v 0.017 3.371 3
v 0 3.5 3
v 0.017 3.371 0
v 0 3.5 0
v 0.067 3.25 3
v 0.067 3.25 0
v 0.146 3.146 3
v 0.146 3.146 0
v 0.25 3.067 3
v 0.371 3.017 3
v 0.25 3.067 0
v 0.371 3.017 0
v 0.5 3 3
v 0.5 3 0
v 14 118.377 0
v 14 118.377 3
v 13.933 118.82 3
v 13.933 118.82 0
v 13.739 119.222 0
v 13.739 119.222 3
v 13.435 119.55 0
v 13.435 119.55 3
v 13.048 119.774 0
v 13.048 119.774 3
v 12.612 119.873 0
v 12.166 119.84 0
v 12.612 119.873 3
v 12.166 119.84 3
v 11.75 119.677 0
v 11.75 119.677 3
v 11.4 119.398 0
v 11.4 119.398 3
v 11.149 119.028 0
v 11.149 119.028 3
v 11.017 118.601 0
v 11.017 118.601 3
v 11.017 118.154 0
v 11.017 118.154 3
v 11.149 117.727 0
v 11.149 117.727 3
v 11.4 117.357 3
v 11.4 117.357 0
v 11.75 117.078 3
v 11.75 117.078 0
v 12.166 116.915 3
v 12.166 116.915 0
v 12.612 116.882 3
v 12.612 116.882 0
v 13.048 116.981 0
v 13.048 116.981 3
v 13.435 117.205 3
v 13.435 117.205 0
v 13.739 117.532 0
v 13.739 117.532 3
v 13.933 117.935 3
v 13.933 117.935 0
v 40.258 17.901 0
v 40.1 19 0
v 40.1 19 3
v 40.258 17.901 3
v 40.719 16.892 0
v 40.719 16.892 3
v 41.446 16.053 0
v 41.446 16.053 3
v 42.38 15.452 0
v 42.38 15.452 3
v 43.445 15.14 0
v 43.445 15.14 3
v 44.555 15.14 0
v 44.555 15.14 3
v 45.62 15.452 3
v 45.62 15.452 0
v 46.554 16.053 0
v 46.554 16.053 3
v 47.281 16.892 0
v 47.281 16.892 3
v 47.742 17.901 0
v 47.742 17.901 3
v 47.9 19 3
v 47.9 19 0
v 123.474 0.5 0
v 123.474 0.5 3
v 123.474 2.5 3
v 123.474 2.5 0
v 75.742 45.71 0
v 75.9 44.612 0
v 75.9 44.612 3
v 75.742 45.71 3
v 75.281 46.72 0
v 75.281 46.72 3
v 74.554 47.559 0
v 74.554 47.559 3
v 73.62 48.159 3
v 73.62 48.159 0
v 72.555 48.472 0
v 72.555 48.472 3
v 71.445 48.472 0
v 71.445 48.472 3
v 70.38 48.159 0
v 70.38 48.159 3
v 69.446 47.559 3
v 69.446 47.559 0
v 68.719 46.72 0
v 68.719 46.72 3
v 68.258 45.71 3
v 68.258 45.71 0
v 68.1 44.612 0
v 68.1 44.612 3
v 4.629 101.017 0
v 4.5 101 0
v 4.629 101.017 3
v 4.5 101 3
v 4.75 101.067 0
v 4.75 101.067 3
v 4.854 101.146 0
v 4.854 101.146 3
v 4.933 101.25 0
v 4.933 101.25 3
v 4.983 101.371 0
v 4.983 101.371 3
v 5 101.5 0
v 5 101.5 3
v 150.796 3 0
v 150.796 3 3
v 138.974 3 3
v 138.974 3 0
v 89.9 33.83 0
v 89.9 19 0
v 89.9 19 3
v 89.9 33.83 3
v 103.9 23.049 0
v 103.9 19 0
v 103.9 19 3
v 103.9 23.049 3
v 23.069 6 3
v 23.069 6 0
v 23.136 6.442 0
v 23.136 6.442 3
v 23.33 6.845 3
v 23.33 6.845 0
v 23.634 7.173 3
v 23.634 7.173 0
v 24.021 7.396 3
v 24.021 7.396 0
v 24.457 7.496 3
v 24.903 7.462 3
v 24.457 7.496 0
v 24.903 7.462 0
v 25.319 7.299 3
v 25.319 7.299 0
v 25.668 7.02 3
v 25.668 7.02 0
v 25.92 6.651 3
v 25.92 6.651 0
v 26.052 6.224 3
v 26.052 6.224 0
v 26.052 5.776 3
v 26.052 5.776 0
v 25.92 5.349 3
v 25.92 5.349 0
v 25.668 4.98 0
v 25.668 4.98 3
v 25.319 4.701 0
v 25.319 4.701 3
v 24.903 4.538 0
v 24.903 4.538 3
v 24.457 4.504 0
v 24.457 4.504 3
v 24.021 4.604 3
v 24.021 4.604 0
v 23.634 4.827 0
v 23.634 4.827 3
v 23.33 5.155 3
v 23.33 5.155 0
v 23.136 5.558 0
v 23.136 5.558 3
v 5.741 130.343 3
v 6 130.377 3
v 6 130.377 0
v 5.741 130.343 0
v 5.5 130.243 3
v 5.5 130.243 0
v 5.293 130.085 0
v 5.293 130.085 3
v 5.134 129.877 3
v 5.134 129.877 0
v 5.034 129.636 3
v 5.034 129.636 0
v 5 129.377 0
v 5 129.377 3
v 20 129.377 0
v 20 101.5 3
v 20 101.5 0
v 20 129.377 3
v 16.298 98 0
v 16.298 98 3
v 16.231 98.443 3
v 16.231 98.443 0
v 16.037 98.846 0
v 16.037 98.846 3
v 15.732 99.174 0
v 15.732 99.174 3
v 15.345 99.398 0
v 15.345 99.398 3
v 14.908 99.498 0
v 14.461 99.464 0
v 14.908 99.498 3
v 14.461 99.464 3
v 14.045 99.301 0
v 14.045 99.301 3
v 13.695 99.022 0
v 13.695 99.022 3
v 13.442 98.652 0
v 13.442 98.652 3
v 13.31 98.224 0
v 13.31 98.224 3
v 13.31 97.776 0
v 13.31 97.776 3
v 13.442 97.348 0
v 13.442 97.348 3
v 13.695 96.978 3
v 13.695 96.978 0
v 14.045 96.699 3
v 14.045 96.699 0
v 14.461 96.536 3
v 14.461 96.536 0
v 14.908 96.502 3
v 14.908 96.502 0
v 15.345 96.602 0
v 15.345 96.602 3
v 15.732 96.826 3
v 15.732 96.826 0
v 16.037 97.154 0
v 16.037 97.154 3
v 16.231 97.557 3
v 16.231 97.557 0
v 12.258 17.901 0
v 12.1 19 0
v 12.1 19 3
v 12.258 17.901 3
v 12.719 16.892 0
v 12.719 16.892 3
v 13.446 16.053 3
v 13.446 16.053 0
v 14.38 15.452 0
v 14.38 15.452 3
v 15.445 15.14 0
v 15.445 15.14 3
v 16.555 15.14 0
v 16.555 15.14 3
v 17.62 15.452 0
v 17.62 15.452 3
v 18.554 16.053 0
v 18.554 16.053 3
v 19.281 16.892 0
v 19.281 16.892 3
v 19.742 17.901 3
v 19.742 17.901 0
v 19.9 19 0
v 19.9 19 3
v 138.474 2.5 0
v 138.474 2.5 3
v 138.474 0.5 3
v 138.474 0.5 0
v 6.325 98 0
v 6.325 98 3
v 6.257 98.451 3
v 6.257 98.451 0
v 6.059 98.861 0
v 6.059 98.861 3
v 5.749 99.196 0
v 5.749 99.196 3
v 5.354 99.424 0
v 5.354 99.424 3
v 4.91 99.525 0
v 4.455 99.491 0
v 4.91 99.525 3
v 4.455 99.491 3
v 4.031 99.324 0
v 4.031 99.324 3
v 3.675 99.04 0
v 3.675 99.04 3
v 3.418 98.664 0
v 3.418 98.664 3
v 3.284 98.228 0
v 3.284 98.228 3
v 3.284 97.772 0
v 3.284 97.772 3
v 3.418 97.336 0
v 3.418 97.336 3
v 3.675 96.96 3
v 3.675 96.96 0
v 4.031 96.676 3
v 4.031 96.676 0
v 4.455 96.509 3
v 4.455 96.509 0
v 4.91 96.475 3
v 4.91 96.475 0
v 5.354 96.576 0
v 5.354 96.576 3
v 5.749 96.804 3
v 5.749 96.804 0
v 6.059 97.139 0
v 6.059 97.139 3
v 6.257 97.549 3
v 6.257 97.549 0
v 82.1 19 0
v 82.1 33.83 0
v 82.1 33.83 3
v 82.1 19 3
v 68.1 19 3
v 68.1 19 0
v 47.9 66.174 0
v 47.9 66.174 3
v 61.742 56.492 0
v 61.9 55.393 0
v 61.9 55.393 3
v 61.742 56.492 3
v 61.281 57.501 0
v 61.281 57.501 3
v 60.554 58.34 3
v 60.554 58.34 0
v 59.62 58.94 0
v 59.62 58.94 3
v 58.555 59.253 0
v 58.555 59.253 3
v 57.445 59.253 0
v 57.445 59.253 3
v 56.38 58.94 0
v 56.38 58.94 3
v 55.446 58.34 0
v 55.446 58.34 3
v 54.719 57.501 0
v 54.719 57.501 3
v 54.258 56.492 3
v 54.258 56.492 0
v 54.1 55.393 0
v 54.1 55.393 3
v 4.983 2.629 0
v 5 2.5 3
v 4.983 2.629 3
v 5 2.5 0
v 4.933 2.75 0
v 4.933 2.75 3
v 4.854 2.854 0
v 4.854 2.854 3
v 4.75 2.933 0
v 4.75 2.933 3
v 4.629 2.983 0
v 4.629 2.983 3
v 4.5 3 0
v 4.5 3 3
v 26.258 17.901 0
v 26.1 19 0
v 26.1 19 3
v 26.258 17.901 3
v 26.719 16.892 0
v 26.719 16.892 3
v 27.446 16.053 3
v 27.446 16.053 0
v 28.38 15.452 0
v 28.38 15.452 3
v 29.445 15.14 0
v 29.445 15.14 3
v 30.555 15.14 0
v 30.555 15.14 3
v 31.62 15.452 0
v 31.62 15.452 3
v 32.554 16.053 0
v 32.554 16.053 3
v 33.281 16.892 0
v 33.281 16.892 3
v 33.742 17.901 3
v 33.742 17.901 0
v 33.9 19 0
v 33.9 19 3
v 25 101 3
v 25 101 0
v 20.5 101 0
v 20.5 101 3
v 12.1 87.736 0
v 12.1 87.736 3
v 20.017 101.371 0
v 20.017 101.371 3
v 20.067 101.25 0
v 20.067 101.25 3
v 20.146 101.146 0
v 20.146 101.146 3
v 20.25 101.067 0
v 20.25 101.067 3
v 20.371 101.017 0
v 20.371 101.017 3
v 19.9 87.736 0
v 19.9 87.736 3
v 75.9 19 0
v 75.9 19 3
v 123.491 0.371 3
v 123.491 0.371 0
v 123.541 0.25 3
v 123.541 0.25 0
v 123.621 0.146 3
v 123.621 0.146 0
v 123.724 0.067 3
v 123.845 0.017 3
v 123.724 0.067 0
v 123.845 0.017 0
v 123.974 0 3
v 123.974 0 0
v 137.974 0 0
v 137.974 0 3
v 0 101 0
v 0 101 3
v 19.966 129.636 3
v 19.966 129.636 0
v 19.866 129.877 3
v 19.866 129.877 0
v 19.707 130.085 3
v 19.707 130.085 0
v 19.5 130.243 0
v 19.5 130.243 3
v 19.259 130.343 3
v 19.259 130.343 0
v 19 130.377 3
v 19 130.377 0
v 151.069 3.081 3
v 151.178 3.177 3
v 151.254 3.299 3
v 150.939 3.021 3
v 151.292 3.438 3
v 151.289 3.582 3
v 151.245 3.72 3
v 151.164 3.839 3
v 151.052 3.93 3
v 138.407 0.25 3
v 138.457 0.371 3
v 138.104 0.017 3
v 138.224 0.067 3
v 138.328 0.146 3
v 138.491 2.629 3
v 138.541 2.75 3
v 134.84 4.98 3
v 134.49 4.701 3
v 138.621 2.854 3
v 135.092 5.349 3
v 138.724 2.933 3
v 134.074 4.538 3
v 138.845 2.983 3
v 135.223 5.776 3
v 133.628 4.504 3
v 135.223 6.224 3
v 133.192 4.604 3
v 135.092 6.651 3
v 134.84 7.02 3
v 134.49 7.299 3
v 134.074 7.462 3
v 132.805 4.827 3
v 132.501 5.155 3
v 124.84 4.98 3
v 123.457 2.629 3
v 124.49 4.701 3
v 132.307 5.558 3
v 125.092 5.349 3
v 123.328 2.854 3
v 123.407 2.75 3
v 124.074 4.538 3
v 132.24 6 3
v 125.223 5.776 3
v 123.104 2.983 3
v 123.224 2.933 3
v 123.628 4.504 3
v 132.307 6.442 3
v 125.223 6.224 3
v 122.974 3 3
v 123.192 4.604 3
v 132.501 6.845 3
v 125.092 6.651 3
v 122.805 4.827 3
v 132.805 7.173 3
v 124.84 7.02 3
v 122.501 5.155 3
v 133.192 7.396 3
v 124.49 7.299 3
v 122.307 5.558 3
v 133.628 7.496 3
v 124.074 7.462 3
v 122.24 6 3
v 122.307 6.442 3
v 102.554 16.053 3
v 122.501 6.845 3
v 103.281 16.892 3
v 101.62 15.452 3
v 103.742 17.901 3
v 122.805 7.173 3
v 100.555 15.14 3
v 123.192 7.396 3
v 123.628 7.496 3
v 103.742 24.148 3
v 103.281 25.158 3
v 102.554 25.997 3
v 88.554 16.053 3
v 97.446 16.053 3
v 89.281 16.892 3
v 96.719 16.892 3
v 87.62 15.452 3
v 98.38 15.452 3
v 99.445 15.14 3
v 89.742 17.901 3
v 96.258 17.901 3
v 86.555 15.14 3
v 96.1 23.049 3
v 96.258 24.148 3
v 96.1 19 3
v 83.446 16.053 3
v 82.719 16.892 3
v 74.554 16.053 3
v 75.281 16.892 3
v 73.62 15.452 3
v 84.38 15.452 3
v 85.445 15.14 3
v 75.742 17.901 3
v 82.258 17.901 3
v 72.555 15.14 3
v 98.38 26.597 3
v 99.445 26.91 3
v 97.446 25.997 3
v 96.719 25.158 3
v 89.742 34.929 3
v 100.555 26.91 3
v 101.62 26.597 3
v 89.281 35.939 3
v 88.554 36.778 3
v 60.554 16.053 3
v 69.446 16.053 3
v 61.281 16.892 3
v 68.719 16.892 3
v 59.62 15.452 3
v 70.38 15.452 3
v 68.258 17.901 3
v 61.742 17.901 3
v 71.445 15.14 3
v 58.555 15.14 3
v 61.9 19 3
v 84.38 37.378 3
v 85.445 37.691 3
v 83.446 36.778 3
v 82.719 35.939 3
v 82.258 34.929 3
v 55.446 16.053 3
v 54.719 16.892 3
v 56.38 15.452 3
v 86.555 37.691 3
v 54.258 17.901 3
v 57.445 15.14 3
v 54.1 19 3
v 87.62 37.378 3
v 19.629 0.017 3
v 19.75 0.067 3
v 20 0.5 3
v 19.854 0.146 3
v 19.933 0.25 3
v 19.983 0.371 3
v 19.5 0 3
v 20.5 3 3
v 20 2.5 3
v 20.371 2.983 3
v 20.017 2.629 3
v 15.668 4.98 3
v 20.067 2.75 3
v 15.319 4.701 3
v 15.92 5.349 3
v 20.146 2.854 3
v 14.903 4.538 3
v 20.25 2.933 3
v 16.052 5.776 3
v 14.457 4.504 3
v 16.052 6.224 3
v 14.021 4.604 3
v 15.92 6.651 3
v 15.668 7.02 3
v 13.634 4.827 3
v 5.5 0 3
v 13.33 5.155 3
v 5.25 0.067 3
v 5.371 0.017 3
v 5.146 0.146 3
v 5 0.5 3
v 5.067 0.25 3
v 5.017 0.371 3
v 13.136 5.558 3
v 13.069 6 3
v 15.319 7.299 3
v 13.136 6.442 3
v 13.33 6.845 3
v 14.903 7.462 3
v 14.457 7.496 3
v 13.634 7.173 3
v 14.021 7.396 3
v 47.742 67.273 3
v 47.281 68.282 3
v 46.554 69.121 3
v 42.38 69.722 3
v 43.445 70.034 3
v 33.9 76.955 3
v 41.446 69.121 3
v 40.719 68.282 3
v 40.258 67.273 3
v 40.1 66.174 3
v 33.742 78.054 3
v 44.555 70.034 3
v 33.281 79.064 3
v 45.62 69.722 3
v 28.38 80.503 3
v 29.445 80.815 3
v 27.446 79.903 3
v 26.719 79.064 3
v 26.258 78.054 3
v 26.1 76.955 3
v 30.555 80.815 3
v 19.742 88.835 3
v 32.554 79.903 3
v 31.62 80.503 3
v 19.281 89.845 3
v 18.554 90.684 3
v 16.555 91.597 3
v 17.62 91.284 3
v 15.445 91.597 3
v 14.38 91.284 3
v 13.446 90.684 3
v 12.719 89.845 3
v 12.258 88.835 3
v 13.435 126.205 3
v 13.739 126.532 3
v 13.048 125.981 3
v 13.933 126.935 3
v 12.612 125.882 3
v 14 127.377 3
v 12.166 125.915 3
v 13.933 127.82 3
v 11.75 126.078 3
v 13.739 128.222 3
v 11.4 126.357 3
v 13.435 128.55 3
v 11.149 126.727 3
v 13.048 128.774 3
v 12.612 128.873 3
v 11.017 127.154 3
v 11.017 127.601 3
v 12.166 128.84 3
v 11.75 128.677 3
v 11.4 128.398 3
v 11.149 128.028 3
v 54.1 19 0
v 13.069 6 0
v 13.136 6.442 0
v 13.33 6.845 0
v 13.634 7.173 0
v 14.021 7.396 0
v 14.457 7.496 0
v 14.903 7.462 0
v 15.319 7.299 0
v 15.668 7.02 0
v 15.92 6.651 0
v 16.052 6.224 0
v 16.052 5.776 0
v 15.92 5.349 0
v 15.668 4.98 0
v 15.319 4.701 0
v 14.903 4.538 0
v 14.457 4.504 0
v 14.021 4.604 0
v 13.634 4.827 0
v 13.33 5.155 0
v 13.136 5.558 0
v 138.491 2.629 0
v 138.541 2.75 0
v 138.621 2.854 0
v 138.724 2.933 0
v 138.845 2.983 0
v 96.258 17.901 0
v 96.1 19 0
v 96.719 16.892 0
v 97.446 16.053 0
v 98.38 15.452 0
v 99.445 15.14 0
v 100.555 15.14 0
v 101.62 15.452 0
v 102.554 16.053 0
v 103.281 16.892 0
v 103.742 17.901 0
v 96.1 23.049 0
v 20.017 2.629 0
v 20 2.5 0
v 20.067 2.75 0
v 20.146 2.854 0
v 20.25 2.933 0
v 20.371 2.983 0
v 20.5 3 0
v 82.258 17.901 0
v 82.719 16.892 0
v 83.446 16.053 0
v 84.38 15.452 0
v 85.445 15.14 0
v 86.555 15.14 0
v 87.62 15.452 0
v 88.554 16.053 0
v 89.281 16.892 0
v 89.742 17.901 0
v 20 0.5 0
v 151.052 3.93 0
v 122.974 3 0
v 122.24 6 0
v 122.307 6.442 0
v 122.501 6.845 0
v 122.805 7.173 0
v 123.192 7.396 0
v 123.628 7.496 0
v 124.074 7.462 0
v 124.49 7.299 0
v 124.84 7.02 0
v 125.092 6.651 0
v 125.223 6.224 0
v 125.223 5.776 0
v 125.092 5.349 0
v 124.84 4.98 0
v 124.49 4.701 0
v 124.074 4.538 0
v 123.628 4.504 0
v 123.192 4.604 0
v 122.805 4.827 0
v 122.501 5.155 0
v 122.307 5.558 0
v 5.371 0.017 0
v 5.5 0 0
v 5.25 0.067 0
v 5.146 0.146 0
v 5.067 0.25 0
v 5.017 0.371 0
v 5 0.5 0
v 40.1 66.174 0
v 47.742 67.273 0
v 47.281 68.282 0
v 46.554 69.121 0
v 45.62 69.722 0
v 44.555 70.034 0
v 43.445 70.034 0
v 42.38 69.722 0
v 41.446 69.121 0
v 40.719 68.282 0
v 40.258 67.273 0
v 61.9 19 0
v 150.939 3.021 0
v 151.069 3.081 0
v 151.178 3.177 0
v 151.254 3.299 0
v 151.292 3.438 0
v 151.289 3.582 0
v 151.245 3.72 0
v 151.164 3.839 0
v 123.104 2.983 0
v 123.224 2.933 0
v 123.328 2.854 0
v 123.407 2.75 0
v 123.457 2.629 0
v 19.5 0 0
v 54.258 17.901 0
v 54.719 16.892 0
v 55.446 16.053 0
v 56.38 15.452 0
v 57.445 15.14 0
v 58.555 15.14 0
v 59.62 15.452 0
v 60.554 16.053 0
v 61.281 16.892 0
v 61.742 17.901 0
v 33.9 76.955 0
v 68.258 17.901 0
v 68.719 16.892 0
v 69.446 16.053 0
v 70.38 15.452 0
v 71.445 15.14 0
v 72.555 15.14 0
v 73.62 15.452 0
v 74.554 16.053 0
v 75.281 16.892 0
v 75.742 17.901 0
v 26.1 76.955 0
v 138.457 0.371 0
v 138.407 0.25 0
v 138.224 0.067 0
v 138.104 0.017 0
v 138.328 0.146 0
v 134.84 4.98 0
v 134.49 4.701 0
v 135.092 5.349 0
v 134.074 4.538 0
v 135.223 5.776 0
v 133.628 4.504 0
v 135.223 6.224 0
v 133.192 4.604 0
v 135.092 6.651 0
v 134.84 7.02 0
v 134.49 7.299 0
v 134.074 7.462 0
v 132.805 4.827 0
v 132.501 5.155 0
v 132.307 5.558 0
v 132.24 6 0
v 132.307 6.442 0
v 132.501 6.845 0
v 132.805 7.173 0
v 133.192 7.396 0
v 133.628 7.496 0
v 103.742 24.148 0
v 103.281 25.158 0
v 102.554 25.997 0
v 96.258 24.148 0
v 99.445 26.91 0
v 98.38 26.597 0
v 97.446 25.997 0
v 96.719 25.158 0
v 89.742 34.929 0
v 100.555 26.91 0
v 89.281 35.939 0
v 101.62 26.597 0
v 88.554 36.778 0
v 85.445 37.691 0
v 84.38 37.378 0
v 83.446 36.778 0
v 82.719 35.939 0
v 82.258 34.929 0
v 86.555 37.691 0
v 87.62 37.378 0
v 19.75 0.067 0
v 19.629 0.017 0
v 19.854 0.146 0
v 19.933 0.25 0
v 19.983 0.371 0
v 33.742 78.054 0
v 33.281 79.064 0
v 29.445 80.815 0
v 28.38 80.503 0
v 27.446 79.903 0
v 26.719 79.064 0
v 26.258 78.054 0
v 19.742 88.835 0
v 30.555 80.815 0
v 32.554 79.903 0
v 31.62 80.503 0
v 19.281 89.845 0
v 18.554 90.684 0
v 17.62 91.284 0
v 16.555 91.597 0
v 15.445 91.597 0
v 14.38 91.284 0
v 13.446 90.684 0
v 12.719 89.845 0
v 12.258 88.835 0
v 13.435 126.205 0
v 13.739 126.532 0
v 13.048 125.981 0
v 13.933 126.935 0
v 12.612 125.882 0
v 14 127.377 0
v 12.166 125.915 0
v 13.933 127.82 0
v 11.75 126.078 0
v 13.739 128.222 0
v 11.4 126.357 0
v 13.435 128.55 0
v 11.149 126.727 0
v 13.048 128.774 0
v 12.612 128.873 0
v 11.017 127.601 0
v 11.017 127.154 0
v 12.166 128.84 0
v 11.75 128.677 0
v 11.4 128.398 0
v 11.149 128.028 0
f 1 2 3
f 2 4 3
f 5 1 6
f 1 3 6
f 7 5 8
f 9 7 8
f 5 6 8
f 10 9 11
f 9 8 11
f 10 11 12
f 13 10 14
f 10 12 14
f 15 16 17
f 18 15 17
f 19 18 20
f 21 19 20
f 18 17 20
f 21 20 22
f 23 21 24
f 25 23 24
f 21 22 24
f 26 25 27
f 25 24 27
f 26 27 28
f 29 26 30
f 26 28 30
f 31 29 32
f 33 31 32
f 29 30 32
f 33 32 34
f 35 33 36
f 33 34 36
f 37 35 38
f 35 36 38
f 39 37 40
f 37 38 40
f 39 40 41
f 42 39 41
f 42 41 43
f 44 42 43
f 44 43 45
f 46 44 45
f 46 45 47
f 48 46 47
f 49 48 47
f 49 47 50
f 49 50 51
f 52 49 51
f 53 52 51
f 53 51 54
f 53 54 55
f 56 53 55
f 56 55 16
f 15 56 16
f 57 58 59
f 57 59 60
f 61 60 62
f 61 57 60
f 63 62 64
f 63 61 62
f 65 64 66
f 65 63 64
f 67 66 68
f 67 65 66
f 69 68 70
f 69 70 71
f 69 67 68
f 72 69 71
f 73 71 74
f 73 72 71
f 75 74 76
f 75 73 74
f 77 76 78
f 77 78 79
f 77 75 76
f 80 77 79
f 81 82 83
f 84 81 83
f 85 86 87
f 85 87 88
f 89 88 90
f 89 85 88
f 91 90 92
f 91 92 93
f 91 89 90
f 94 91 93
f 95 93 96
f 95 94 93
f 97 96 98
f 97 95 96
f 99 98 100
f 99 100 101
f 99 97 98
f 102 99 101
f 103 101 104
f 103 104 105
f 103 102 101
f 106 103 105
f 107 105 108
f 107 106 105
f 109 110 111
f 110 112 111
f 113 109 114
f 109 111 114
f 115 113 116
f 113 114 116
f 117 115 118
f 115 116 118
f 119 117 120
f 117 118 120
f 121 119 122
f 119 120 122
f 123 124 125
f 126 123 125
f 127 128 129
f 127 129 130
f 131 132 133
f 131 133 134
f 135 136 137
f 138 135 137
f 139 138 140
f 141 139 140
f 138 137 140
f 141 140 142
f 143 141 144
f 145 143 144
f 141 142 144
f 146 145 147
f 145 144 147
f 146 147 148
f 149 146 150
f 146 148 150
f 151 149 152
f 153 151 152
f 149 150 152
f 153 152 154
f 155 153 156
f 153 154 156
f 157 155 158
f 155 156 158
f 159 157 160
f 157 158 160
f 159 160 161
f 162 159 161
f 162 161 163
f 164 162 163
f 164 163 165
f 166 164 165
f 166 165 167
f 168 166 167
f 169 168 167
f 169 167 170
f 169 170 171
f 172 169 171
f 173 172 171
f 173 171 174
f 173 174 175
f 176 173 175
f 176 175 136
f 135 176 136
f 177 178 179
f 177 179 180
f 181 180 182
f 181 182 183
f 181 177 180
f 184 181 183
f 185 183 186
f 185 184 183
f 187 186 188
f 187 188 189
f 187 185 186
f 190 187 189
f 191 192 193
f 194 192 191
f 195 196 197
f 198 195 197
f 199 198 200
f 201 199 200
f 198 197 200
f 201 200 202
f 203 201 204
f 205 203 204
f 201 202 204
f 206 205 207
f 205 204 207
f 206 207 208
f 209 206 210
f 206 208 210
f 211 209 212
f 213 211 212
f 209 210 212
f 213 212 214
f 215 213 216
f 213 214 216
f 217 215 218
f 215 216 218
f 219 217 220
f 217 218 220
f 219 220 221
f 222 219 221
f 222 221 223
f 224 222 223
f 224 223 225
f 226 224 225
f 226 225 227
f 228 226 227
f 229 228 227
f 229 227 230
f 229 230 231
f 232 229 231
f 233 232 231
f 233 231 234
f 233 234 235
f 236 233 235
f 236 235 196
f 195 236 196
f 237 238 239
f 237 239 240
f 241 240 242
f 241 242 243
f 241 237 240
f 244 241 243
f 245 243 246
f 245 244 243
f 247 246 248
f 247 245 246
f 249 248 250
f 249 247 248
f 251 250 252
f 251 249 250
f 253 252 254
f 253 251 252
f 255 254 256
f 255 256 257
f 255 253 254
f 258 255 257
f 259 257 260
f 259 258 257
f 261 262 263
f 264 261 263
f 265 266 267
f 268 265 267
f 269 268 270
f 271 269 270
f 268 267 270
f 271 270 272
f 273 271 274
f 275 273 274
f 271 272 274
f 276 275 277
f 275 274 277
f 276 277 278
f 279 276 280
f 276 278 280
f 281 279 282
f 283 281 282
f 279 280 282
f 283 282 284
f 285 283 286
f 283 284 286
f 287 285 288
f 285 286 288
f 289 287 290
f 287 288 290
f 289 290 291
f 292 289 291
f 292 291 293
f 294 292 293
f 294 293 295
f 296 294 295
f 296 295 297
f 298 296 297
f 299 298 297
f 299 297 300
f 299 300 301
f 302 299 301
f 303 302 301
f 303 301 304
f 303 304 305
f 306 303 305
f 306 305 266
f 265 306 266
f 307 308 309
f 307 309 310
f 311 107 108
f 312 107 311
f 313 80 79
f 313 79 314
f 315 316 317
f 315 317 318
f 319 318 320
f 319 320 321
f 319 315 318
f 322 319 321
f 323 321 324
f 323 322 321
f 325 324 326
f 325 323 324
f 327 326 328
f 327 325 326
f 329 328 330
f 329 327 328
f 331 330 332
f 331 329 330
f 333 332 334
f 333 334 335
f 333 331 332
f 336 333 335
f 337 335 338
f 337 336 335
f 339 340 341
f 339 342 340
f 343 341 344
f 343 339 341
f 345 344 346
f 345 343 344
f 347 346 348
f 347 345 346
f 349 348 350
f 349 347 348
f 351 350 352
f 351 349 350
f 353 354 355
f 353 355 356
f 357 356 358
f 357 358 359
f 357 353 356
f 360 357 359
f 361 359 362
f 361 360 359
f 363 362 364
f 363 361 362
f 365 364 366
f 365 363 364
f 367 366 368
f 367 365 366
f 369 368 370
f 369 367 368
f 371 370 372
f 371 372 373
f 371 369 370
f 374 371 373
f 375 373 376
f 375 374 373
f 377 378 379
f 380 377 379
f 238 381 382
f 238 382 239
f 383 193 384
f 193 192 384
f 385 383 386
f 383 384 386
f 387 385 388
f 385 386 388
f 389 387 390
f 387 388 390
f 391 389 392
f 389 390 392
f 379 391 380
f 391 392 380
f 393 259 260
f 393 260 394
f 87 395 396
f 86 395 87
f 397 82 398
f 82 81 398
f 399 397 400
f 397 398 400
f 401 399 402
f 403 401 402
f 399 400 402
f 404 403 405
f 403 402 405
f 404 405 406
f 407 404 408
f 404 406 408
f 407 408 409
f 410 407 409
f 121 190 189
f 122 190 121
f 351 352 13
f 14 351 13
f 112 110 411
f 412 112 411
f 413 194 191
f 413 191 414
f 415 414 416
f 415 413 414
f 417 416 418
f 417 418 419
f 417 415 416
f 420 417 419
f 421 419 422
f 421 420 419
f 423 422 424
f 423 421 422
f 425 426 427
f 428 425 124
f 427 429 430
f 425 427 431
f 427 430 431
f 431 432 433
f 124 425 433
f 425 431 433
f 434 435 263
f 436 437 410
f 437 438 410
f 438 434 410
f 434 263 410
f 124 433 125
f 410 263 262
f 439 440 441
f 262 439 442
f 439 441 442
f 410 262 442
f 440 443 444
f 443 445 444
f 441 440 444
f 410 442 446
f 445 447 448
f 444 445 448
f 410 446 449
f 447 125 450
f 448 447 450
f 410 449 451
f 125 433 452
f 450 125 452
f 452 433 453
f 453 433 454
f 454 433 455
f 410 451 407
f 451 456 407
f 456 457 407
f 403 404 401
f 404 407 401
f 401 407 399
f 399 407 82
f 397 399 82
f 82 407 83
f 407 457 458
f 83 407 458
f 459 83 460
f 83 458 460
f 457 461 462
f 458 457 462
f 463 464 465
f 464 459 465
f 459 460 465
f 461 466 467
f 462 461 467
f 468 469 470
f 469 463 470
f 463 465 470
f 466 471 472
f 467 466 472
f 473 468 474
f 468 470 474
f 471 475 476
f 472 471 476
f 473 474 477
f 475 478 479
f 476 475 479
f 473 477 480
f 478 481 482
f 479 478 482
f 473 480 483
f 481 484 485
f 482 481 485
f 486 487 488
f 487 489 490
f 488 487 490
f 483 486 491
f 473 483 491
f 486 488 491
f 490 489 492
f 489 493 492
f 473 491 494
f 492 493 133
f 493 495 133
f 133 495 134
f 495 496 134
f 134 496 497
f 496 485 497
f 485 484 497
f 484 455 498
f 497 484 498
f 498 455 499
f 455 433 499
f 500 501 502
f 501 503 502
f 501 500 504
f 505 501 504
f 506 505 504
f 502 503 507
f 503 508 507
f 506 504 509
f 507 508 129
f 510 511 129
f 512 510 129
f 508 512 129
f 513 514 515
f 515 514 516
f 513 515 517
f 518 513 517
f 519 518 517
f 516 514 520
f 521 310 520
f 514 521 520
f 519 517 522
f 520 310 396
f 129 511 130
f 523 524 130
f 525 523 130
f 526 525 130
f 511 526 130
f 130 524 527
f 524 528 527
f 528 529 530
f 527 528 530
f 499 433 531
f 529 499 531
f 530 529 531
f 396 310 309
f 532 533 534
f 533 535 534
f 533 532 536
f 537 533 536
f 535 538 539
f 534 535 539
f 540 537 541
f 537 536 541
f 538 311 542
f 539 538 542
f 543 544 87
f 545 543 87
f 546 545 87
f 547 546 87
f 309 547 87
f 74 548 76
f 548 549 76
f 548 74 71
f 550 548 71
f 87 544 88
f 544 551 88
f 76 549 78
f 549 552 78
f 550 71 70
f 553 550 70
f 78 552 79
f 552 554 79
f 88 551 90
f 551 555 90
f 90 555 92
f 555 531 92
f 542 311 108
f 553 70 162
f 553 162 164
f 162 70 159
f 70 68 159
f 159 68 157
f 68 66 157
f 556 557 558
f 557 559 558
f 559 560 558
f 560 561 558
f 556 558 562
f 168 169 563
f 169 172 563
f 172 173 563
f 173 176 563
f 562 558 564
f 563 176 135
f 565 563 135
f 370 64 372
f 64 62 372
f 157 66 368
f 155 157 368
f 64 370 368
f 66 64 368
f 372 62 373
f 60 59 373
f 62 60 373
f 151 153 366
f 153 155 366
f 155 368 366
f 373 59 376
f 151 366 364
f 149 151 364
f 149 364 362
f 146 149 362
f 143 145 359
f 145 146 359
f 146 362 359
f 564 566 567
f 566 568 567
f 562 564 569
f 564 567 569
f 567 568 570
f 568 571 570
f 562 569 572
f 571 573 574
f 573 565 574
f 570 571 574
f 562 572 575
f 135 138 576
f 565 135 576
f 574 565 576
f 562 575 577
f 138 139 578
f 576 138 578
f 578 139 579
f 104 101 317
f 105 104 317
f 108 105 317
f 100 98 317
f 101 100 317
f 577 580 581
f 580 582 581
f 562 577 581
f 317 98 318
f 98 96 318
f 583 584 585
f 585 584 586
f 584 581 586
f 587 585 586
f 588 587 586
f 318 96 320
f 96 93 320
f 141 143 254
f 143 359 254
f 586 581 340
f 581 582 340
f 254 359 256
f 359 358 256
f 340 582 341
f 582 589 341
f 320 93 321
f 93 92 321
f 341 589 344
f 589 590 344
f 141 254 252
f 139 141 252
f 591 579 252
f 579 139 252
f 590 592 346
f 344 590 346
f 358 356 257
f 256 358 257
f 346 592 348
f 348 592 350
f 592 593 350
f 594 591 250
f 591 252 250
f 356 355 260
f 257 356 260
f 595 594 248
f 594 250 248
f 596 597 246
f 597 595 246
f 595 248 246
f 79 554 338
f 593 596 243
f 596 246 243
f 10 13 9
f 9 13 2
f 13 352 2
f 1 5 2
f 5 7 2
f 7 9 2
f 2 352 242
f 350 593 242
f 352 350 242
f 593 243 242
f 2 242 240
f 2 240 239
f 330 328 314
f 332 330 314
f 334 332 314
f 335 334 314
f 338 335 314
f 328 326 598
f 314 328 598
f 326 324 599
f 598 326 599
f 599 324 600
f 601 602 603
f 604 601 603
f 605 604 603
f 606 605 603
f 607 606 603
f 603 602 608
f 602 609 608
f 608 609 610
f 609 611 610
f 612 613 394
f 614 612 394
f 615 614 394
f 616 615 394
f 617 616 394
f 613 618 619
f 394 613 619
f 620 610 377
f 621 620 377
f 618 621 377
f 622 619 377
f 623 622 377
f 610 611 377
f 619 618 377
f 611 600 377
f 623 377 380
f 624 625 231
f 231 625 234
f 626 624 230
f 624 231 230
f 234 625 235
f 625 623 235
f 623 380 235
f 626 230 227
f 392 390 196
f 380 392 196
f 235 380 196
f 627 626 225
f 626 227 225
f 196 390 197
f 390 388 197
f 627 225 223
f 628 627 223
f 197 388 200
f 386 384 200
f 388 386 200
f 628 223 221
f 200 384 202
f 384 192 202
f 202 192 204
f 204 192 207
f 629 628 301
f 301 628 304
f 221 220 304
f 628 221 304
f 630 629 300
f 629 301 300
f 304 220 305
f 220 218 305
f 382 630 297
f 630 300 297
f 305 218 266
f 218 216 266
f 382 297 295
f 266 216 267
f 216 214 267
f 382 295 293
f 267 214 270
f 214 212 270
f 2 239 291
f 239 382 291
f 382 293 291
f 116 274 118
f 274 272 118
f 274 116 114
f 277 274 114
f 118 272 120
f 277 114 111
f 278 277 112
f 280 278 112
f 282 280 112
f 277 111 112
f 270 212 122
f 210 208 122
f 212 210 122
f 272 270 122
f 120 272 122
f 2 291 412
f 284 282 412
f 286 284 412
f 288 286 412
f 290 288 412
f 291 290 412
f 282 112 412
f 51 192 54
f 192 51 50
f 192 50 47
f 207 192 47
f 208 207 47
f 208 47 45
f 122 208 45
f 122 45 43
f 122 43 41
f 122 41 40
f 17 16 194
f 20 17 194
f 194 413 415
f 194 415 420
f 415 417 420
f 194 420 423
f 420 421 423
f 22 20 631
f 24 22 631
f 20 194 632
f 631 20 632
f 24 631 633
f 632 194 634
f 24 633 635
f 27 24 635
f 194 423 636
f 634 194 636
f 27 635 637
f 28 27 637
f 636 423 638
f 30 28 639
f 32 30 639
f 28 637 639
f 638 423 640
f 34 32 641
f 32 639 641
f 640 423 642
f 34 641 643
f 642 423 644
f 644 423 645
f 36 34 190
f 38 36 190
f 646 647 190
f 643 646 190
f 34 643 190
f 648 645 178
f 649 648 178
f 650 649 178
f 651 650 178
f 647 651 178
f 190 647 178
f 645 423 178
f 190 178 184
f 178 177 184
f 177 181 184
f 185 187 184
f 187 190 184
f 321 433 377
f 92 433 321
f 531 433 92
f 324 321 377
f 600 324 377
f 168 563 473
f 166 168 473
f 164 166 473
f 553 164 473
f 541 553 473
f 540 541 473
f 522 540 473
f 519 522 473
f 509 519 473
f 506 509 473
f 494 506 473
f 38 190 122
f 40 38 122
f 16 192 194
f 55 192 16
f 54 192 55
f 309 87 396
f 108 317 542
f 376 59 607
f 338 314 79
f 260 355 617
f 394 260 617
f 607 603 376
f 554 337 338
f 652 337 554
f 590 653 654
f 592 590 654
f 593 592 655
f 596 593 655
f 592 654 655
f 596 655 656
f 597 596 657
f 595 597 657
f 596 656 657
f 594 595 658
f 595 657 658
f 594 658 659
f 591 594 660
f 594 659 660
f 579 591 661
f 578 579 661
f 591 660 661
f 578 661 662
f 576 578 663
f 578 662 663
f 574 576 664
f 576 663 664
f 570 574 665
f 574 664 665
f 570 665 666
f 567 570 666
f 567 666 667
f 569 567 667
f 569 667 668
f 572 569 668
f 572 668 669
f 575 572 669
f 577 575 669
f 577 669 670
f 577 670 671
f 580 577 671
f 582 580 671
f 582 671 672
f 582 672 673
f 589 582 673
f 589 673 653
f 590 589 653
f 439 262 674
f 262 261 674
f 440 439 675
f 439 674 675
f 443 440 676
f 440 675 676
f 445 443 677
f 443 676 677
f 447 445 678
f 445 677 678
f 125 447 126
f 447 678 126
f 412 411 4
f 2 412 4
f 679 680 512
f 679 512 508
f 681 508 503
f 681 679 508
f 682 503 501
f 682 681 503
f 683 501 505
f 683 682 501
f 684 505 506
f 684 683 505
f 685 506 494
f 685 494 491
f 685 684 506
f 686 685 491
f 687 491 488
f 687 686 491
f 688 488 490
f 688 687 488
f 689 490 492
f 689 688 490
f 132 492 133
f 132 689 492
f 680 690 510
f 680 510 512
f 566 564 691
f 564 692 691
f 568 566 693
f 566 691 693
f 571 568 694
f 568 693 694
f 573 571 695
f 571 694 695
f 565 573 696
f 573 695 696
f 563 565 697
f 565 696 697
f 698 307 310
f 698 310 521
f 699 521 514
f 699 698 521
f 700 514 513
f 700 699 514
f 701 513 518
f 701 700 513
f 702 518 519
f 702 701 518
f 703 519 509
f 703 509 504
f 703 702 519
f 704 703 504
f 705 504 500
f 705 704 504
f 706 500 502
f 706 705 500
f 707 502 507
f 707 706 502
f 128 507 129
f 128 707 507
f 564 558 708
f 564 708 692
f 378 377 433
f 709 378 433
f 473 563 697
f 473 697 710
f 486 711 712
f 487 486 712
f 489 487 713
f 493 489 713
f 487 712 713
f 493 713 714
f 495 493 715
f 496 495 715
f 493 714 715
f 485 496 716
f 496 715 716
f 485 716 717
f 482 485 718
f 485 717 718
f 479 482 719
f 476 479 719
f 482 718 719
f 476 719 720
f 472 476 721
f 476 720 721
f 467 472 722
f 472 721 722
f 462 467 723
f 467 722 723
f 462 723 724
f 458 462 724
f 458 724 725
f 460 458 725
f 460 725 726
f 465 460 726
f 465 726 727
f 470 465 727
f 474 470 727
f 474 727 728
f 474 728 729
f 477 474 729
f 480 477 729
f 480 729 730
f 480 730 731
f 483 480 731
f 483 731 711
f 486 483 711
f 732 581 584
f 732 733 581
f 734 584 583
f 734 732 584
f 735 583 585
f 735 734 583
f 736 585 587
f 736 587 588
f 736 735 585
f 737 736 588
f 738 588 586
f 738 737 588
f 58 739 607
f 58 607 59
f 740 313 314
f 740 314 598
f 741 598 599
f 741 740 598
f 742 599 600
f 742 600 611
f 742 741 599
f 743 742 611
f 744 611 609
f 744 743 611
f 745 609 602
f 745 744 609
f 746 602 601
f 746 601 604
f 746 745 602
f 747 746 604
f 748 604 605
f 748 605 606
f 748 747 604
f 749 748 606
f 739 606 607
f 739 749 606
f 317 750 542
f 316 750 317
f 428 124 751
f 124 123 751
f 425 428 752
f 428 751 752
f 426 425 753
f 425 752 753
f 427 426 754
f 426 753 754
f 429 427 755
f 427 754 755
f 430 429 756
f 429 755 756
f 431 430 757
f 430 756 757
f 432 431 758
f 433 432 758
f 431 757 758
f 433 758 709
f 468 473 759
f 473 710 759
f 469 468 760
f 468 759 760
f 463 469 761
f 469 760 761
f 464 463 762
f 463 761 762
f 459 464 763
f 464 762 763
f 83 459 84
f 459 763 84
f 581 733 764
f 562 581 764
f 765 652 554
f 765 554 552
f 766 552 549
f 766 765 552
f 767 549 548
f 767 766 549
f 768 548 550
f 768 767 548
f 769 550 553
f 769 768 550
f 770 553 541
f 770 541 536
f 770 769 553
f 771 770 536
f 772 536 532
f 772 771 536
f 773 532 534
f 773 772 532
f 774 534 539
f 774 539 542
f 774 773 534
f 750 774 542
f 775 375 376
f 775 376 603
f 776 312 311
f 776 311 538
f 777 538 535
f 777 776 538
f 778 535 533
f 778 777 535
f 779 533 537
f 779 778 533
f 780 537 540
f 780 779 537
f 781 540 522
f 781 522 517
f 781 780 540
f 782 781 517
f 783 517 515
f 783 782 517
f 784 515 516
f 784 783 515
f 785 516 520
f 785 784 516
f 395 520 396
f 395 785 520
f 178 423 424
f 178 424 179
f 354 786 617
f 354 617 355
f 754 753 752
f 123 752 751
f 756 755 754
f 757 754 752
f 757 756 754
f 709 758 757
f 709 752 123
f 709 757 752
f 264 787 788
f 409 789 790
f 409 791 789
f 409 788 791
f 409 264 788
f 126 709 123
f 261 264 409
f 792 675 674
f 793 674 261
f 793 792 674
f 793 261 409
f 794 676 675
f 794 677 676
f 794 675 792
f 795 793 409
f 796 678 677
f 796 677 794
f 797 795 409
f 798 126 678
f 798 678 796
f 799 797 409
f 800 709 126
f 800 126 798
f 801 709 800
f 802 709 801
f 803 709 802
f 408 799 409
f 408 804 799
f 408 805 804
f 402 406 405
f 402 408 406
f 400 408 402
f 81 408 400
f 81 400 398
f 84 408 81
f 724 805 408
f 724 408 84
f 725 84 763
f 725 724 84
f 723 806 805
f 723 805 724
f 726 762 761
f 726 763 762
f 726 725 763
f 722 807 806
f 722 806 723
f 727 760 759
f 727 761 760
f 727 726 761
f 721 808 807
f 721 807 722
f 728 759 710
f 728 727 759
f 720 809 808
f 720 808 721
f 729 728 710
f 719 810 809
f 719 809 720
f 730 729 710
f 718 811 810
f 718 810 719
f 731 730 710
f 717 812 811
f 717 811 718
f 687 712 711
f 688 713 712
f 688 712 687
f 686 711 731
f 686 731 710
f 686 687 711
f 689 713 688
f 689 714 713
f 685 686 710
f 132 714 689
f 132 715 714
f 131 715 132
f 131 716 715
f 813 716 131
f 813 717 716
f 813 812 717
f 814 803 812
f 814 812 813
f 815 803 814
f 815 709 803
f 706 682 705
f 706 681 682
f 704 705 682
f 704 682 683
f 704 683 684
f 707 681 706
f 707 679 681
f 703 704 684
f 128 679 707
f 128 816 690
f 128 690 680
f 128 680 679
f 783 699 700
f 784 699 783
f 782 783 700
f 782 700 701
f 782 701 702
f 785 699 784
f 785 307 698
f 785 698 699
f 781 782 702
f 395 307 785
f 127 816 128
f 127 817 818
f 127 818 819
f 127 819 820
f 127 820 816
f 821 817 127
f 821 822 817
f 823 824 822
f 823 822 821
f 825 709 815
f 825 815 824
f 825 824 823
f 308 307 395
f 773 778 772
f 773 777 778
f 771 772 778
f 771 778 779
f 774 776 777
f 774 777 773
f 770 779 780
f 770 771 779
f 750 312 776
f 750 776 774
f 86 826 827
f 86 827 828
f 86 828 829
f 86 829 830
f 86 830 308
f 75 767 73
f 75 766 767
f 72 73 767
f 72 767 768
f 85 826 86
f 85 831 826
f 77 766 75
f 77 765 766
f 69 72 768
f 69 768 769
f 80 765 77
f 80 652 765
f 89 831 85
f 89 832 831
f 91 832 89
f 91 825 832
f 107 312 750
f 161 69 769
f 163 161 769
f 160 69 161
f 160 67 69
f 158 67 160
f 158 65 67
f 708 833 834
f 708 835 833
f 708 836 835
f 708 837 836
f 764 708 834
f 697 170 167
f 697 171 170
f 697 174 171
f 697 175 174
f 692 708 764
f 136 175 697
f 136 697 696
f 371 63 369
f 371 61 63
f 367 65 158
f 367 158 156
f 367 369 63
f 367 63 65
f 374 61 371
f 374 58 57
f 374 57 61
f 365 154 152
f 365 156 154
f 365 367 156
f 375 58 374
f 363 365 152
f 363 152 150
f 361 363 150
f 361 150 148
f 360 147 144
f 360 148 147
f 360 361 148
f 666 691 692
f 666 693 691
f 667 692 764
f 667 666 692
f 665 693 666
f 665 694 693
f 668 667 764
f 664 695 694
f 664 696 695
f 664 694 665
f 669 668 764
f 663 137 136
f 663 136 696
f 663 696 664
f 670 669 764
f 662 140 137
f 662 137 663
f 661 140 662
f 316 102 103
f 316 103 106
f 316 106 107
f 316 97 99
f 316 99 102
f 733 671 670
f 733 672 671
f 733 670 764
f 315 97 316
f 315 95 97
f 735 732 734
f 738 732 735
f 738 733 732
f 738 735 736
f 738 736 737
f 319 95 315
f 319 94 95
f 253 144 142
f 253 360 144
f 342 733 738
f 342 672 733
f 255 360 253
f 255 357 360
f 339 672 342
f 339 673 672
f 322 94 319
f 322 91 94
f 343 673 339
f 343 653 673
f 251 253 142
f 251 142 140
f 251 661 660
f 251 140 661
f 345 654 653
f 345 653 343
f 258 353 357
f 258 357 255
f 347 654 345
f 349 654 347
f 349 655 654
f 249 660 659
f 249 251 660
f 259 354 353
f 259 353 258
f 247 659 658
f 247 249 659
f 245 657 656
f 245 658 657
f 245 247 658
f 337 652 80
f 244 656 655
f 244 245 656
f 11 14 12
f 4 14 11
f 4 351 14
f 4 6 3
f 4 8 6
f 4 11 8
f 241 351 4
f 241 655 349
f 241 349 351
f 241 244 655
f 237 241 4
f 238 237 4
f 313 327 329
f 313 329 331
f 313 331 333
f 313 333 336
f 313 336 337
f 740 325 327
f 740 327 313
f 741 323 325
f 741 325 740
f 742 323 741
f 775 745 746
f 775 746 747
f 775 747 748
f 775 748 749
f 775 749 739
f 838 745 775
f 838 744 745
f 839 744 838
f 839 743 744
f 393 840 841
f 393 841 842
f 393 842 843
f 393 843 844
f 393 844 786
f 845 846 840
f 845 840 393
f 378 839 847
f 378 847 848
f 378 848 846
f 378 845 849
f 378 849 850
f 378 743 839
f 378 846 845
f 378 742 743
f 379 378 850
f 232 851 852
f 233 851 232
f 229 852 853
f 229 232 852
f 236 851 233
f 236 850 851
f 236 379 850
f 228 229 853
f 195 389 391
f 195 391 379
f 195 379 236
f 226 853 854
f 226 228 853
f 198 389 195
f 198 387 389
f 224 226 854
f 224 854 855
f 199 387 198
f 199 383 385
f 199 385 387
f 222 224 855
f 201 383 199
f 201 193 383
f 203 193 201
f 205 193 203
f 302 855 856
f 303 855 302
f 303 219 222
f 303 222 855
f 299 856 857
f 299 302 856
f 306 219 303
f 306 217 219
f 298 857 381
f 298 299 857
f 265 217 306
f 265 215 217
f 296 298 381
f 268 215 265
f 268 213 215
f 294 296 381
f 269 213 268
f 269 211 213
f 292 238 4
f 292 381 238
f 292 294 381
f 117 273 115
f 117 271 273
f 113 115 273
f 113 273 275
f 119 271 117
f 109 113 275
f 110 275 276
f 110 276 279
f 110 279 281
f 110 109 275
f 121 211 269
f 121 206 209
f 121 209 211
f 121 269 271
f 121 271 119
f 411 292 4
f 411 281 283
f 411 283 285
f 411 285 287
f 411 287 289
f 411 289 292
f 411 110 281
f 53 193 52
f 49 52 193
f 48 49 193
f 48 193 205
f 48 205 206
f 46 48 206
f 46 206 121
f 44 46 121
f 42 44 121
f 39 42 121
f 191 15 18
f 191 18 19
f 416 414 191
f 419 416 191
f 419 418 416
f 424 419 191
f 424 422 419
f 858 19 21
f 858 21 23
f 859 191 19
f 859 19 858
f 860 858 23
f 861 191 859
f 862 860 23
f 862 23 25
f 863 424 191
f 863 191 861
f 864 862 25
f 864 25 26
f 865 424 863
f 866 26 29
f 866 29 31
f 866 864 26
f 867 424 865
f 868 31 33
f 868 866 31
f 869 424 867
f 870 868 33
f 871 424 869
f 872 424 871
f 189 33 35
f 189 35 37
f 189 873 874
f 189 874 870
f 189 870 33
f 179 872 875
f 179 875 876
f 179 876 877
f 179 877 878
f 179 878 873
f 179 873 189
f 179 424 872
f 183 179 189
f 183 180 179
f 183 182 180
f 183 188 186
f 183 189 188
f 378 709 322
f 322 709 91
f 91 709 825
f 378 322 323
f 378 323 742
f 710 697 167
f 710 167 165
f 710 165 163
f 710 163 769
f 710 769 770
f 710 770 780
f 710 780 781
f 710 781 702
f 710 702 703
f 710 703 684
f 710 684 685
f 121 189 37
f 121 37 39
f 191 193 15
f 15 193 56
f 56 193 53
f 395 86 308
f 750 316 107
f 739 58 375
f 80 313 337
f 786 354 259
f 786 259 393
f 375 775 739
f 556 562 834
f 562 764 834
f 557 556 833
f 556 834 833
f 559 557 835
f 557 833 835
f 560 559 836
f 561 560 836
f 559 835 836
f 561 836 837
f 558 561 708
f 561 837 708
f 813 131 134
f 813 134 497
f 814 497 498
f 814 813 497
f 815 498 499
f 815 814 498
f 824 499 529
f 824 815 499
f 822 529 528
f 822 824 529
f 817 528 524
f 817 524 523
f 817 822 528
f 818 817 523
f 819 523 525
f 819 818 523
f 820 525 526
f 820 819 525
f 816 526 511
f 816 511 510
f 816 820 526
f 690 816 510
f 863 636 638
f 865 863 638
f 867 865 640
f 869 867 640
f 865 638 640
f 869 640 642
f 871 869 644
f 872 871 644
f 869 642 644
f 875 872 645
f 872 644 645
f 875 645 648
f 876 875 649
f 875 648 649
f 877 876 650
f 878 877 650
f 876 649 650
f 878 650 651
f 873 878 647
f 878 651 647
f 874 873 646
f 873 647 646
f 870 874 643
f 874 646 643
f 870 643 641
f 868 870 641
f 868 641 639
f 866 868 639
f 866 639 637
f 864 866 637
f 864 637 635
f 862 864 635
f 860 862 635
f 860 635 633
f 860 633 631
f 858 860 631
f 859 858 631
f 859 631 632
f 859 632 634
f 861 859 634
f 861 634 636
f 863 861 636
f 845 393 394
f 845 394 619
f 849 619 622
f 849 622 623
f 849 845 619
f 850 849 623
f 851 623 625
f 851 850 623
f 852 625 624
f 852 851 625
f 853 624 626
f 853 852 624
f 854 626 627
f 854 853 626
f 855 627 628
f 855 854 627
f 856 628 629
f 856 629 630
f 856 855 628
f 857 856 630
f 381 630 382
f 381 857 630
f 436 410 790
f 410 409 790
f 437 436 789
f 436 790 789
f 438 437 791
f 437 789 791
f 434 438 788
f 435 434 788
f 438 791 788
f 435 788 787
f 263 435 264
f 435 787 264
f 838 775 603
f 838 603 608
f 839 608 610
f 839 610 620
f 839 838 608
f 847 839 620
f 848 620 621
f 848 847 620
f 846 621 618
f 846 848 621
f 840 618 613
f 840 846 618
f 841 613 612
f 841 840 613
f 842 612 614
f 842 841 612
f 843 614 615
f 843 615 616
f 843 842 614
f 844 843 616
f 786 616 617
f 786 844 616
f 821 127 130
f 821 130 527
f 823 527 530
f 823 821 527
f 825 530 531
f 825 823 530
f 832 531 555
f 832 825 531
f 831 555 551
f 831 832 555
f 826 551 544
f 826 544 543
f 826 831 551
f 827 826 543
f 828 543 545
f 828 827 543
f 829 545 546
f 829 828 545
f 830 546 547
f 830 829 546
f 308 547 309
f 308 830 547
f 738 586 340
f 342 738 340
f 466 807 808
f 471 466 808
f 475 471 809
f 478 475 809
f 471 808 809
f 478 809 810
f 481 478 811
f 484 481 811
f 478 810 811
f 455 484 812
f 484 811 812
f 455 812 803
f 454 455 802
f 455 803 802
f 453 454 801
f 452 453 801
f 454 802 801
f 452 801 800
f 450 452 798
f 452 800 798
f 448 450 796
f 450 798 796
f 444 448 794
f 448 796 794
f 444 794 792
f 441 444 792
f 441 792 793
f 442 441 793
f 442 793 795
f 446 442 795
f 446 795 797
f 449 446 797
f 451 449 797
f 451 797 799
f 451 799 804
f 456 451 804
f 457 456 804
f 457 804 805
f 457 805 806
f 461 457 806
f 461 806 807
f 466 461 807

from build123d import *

# Parameters (mm, degrees)
EXTRUDE_1_DEPTH      = 3
SKETCH_2_W           = 15
SKETCH_2_H           = 3
EXTRUDE_2_DEPTH      = 0.5
FILLET_2_R           = 3
FILLET_3_R           = 0.5
FILLET_4_R           = 0.5
SKETCH_6_W           = 103.474287265
SKETCH_6_H           = 3
CUT_EXTRUDE_3_DEPTH  = 10
FILLET_5_R           = 0.5
FILLET_6_R           = 0.5
SKETCH_15_W          = 15
SKETCH_15_H          = 9
EXTRUDE_4_DEPTH      = 3
FILLET_7_R           = 1
SKETCH_16_R          = 1.5
CUT_EXTRUDE_7_DEPTH  = 188.894654659
SKETCH_17_R          = 1.52921897
SKETCH_17_R_2        = 1.502123086
CUT_EXTRUDE_8_DEPTH  = 188.894654659
EXTRUDE_5_DEPTH      = 3
SKETCH_19_R          = 1.5
CUT_EXTRUDE_9_DEPTH  = 10
EXTRUDE_6_DEPTH      = 3
CUT_EXTRUDE_10_DEPTH = 3


with BuildPart() as part:
    # 草图1 → 凸台-拉伸1 (new body)
    with BuildSketch(Plane.XY):
        Polygon((0, 101), (0, 0), (157.65, 0), (25, 79), (25, 101), (20, 101), (20, 104), (5, 104), (5, 101), align=None)
    extrude(amount=EXTRUDE_1_DEPTH)

    # 草图2 → 凸台-拉伸2 (add)
    with BuildSketch(Plane(origin=(0, 104, 0), x_dir=(1, 0, 0), z_dir=(0, 1, 0))):
        with Locations((12.5, -1.5)):
            Rectangle(SKETCH_2_W, SKETCH_2_H)
    extrude(amount=EXTRUDE_2_DEPTH)

    # 圆角2
    fillet_2_edges = [part.edges().sort_by_distance(p)[0] for p in [
        (25, 79, 1.5),
    ]]
    fillet(fillet_2_edges, radius=FILLET_2_R)

    # 圆角3
    fillet_3_edges = [part.edges().sort_by_distance(p)[0] for p in [
        (157.65, 0, 1.5),
    ]]
    fillet(fillet_3_edges, radius=FILLET_3_R)

    # 圆角4
    fillet_4_edges = [part.edges().sort_by_distance(p)[0] for p in [
        (0, 0, 1.5),
    ]]
    fillet(fillet_4_edges, radius=FILLET_4_R)

    # 草图6 → 切除-拉伸3 (cut)
    with BuildSketch(Plane.XY.offset(3)):
        with BuildLine():
            Line((5, 3), (0, 3))
            Line((0, 3), (0, 0.5))
            ThreePointArc((0, 0.5), (0.146446609, 0.146446609), (0.5, 0))
            Line((0.5, 0), (5, 0))
            Line((5, 0), (5, 3))
        make_face()
        with Locations((71.737143632, 1.5)):
            Rectangle(SKETCH_6_W, SKETCH_6_H)
        with BuildLine():
            Line((152.612658228, 3), (138.474287265, 3))
            Line((138.474287265, 3), (138.474287265, 0))
            Line((138.474287265, 0), (155.833275758, 0))
            ThreePointArc((155.833275758, 0), (156.315351251, 0.367322877), (156.089117317, 0.929587124))
            Line((156.089117317, 0.929587124), (152.612658228, 3))
        make_face()
    extrude(amount=-CUT_EXTRUDE_3_DEPTH, mode=Mode.SUBTRACT)

    # 圆角5
    fillet_5_edges = [part.edges().sort_by_distance(p)[0] for p in [
        (20, 0, 1.5),
        (5, 0, 1.5),
        (0, 3, 1.5),
        (123.474287265, 0, 1.5),
        (138.474287265, 0, 1.5),
        (152.612658228, 3, 1.5),
    ]]
    fillet(fillet_5_edges, radius=FILLET_5_R)

    # 圆角6
    fillet_6_edges = [part.edges().sort_by_distance(p)[0] for p in [
        (20, 101, 1.5),
        (5, 101, 1.5),
        (123.474287265, 3, 1.5),
        (138.474287265, 3, 1.5),
        (20, 3, 1.5),
        (5, 3, 1.5),
    ]]
    fillet(fillet_6_edges, radius=FILLET_6_R)

    # 草图15 → 凸台-拉伸4 (add)
    with BuildSketch(Plane(origin=(0, 0, 0), x_dir=(-1, 0, 0), z_dir=(0, 0, -1))):
        with Locations((-12.5, 106.877473525)):
            Rectangle(SKETCH_15_W, SKETCH_15_H)
    extrude(amount=-EXTRUDE_4_DEPTH)

    # 圆角7
    fillet_7_edges = [part.edges().sort_by_distance(p)[0] for p in [
        (5, 111.377473525, 1.5),
        (20, 111.377473525, 1.5),
    ]]
    fillet(fillet_7_edges, radius=FILLET_7_R)

    # 草图16 → 切除-拉伸7 (cut, through all)
    with BuildSketch(Plane(origin=(0, 0, 0), x_dir=(-1, 0, 0), z_dir=(0, 0, -1))):
        with Locations((-14.568919479, 6)):
            Circle(SKETCH_16_R)
        with Locations((-24.568919479, 6)):
            Circle(SKETCH_16_R)
        with Locations((-123.740220593, 6)):
            Circle(SKETCH_16_R)
        with Locations((-133.740220593, 6)):
            Circle(SKETCH_16_R)
    extrude(amount=-CUT_EXTRUDE_7_DEPTH, mode=Mode.SUBTRACT)

    # 草图17 → 切除-拉伸8 (cut, through all)
    with BuildSketch(Plane.XY.offset(3)):
        with Locations((4.795751321, 98)):
            Circle(SKETCH_17_R)
        with Locations((14.795751321, 98)):
            Circle(SKETCH_17_R_2)
    extrude(amount=-CUT_EXTRUDE_8_DEPTH, mode=Mode.SUBTRACT)

    # 草图18 → 凸台-拉伸5 (add)
    with BuildSketch(Plane.XY.offset(3)):
        with BuildLine():
            Line((19, 130.377473525), (6, 130.377473525))
            ThreePointArc((6, 130.377473525), (5.292893219, 130.084580306), (5, 129.377473525))
            Line((5, 129.377473525), (5, 110.377473525))
            Line((5, 110.377473525), (20, 110.377473525))
            Line((20, 110.377473525), (20, 129.377473525))
            ThreePointArc((20, 129.377473525), (19.707106781, 130.084580306), (19, 130.377473525))
        make_face()
    extrude(amount=-EXTRUDE_5_DEPTH)

    # 草图19 → 切除-拉伸9 (cut)
    with BuildSketch(Plane.XY.offset(3)):
        with Locations((12.5, 127.377473525)):
            Circle(SKETCH_19_R)
        with Locations((12.5, 118.377473525)):
            Circle(SKETCH_19_R)
    extrude(amount=-CUT_EXTRUDE_9_DEPTH, mode=Mode.SUBTRACT)

    # 草图21 → 凸台-拉伸6 (add)
    with BuildSketch(Plane.XY.offset(3)):
        with BuildLine():
            Line((25, 101), (151.051775545, 3.929587124))
            Line((151.051775545, 3.929587124), (26.464950647, 78.127545412))
            ThreePointArc((26.464950647, 78.127545412), (25.391825537, 79.222696415), (25, 80.705068154))
            Line((25, 80.705068154), (25, 101))
        make_face()
    extrude(amount=-EXTRUDE_6_DEPTH)

    # 草图22 → 切除-拉伸10 (cut)
    with BuildSketch(Plane(origin=(0, 0, 0), x_dir=(-1, 0, 0), z_dir=(0, 0, -1))):
        with BuildLine():
            Line((-19.9, 19), (-19.9, 87.736313508))
            ThreePointArc((-19.9, 87.736313508), (-16, 91.636313508), (-12.1, 87.736313508))
            Line((-12.1, 87.736313508), (-12.1, 19))
            ThreePointArc((-12.1, 19), (-16, 15.1), (-19.9, 19))
        make_face()
        with BuildLine():
            Line((-26.1, 76.955142244), (-26.1, 19))
            ThreePointArc((-26.1, 19), (-30, 15.1), (-33.9, 19))
            Line((-33.9, 19), (-33.9, 76.955142244))
            ThreePointArc((-33.9, 76.955142244), (-30, 80.855142244), (-26.1, 76.955142244))
        make_face()
        with BuildLine():
            Line((-40.1, 66.17397098), (-40.1, 19))
            ThreePointArc((-40.1, 19), (-44, 15.1), (-47.9, 19))
            Line((-47.9, 19), (-47.9, 66.17397098))
            ThreePointArc((-47.9, 66.17397098), (-44, 70.07397098), (-40.1, 66.17397098))
        make_face()
        with BuildLine():
            Line((-54.1, 55.392799717), (-54.1, 19))
            ThreePointArc((-54.1, 19), (-58, 15.1), (-61.9, 19))
            Line((-61.9, 19), (-61.9, 55.392799717))
            ThreePointArc((-61.9, 55.392799717), (-58, 59.292799717), (-54.1, 55.392799717))
        make_face()
        with BuildLine():
            Line((-68.1, 44.611628453), (-68.1, 19))
            ThreePointArc((-68.1, 19), (-72, 15.1), (-75.9, 19))
            Line((-75.9, 19), (-75.9, 44.611628453))
            ThreePointArc((-75.9, 44.611628453), (-72, 48.511628453), (-68.1, 44.611628453))
        make_face()
        with BuildLine():
            Line((-82.1, 33.830457189), (-82.1, 19))
            ThreePointArc((-82.1, 19), (-86, 15.1), (-89.9, 19))
            Line((-89.9, 19), (-89.9, 33.830457189))
            ThreePointArc((-89.9, 33.830457189), (-86, 37.730457189), (-82.1, 33.830457189))
        make_face()
        with BuildLine():
            Line((-96.1, 23.049285925), (-96.1, 19))
            ThreePointArc((-96.1, 19), (-100, 15.1), (-103.9, 19))
            Line((-103.9, 19), (-103.9, 23.049285925))
            ThreePointArc((-103.9, 23.049285925), (-100, 26.949285925), (-96.1, 23.049285925))
        make_face()
    extrude(amount=-CUT_EXTRUDE_10_DEPTH, mode=Mode.SUBTRACT)


solid = part.part
